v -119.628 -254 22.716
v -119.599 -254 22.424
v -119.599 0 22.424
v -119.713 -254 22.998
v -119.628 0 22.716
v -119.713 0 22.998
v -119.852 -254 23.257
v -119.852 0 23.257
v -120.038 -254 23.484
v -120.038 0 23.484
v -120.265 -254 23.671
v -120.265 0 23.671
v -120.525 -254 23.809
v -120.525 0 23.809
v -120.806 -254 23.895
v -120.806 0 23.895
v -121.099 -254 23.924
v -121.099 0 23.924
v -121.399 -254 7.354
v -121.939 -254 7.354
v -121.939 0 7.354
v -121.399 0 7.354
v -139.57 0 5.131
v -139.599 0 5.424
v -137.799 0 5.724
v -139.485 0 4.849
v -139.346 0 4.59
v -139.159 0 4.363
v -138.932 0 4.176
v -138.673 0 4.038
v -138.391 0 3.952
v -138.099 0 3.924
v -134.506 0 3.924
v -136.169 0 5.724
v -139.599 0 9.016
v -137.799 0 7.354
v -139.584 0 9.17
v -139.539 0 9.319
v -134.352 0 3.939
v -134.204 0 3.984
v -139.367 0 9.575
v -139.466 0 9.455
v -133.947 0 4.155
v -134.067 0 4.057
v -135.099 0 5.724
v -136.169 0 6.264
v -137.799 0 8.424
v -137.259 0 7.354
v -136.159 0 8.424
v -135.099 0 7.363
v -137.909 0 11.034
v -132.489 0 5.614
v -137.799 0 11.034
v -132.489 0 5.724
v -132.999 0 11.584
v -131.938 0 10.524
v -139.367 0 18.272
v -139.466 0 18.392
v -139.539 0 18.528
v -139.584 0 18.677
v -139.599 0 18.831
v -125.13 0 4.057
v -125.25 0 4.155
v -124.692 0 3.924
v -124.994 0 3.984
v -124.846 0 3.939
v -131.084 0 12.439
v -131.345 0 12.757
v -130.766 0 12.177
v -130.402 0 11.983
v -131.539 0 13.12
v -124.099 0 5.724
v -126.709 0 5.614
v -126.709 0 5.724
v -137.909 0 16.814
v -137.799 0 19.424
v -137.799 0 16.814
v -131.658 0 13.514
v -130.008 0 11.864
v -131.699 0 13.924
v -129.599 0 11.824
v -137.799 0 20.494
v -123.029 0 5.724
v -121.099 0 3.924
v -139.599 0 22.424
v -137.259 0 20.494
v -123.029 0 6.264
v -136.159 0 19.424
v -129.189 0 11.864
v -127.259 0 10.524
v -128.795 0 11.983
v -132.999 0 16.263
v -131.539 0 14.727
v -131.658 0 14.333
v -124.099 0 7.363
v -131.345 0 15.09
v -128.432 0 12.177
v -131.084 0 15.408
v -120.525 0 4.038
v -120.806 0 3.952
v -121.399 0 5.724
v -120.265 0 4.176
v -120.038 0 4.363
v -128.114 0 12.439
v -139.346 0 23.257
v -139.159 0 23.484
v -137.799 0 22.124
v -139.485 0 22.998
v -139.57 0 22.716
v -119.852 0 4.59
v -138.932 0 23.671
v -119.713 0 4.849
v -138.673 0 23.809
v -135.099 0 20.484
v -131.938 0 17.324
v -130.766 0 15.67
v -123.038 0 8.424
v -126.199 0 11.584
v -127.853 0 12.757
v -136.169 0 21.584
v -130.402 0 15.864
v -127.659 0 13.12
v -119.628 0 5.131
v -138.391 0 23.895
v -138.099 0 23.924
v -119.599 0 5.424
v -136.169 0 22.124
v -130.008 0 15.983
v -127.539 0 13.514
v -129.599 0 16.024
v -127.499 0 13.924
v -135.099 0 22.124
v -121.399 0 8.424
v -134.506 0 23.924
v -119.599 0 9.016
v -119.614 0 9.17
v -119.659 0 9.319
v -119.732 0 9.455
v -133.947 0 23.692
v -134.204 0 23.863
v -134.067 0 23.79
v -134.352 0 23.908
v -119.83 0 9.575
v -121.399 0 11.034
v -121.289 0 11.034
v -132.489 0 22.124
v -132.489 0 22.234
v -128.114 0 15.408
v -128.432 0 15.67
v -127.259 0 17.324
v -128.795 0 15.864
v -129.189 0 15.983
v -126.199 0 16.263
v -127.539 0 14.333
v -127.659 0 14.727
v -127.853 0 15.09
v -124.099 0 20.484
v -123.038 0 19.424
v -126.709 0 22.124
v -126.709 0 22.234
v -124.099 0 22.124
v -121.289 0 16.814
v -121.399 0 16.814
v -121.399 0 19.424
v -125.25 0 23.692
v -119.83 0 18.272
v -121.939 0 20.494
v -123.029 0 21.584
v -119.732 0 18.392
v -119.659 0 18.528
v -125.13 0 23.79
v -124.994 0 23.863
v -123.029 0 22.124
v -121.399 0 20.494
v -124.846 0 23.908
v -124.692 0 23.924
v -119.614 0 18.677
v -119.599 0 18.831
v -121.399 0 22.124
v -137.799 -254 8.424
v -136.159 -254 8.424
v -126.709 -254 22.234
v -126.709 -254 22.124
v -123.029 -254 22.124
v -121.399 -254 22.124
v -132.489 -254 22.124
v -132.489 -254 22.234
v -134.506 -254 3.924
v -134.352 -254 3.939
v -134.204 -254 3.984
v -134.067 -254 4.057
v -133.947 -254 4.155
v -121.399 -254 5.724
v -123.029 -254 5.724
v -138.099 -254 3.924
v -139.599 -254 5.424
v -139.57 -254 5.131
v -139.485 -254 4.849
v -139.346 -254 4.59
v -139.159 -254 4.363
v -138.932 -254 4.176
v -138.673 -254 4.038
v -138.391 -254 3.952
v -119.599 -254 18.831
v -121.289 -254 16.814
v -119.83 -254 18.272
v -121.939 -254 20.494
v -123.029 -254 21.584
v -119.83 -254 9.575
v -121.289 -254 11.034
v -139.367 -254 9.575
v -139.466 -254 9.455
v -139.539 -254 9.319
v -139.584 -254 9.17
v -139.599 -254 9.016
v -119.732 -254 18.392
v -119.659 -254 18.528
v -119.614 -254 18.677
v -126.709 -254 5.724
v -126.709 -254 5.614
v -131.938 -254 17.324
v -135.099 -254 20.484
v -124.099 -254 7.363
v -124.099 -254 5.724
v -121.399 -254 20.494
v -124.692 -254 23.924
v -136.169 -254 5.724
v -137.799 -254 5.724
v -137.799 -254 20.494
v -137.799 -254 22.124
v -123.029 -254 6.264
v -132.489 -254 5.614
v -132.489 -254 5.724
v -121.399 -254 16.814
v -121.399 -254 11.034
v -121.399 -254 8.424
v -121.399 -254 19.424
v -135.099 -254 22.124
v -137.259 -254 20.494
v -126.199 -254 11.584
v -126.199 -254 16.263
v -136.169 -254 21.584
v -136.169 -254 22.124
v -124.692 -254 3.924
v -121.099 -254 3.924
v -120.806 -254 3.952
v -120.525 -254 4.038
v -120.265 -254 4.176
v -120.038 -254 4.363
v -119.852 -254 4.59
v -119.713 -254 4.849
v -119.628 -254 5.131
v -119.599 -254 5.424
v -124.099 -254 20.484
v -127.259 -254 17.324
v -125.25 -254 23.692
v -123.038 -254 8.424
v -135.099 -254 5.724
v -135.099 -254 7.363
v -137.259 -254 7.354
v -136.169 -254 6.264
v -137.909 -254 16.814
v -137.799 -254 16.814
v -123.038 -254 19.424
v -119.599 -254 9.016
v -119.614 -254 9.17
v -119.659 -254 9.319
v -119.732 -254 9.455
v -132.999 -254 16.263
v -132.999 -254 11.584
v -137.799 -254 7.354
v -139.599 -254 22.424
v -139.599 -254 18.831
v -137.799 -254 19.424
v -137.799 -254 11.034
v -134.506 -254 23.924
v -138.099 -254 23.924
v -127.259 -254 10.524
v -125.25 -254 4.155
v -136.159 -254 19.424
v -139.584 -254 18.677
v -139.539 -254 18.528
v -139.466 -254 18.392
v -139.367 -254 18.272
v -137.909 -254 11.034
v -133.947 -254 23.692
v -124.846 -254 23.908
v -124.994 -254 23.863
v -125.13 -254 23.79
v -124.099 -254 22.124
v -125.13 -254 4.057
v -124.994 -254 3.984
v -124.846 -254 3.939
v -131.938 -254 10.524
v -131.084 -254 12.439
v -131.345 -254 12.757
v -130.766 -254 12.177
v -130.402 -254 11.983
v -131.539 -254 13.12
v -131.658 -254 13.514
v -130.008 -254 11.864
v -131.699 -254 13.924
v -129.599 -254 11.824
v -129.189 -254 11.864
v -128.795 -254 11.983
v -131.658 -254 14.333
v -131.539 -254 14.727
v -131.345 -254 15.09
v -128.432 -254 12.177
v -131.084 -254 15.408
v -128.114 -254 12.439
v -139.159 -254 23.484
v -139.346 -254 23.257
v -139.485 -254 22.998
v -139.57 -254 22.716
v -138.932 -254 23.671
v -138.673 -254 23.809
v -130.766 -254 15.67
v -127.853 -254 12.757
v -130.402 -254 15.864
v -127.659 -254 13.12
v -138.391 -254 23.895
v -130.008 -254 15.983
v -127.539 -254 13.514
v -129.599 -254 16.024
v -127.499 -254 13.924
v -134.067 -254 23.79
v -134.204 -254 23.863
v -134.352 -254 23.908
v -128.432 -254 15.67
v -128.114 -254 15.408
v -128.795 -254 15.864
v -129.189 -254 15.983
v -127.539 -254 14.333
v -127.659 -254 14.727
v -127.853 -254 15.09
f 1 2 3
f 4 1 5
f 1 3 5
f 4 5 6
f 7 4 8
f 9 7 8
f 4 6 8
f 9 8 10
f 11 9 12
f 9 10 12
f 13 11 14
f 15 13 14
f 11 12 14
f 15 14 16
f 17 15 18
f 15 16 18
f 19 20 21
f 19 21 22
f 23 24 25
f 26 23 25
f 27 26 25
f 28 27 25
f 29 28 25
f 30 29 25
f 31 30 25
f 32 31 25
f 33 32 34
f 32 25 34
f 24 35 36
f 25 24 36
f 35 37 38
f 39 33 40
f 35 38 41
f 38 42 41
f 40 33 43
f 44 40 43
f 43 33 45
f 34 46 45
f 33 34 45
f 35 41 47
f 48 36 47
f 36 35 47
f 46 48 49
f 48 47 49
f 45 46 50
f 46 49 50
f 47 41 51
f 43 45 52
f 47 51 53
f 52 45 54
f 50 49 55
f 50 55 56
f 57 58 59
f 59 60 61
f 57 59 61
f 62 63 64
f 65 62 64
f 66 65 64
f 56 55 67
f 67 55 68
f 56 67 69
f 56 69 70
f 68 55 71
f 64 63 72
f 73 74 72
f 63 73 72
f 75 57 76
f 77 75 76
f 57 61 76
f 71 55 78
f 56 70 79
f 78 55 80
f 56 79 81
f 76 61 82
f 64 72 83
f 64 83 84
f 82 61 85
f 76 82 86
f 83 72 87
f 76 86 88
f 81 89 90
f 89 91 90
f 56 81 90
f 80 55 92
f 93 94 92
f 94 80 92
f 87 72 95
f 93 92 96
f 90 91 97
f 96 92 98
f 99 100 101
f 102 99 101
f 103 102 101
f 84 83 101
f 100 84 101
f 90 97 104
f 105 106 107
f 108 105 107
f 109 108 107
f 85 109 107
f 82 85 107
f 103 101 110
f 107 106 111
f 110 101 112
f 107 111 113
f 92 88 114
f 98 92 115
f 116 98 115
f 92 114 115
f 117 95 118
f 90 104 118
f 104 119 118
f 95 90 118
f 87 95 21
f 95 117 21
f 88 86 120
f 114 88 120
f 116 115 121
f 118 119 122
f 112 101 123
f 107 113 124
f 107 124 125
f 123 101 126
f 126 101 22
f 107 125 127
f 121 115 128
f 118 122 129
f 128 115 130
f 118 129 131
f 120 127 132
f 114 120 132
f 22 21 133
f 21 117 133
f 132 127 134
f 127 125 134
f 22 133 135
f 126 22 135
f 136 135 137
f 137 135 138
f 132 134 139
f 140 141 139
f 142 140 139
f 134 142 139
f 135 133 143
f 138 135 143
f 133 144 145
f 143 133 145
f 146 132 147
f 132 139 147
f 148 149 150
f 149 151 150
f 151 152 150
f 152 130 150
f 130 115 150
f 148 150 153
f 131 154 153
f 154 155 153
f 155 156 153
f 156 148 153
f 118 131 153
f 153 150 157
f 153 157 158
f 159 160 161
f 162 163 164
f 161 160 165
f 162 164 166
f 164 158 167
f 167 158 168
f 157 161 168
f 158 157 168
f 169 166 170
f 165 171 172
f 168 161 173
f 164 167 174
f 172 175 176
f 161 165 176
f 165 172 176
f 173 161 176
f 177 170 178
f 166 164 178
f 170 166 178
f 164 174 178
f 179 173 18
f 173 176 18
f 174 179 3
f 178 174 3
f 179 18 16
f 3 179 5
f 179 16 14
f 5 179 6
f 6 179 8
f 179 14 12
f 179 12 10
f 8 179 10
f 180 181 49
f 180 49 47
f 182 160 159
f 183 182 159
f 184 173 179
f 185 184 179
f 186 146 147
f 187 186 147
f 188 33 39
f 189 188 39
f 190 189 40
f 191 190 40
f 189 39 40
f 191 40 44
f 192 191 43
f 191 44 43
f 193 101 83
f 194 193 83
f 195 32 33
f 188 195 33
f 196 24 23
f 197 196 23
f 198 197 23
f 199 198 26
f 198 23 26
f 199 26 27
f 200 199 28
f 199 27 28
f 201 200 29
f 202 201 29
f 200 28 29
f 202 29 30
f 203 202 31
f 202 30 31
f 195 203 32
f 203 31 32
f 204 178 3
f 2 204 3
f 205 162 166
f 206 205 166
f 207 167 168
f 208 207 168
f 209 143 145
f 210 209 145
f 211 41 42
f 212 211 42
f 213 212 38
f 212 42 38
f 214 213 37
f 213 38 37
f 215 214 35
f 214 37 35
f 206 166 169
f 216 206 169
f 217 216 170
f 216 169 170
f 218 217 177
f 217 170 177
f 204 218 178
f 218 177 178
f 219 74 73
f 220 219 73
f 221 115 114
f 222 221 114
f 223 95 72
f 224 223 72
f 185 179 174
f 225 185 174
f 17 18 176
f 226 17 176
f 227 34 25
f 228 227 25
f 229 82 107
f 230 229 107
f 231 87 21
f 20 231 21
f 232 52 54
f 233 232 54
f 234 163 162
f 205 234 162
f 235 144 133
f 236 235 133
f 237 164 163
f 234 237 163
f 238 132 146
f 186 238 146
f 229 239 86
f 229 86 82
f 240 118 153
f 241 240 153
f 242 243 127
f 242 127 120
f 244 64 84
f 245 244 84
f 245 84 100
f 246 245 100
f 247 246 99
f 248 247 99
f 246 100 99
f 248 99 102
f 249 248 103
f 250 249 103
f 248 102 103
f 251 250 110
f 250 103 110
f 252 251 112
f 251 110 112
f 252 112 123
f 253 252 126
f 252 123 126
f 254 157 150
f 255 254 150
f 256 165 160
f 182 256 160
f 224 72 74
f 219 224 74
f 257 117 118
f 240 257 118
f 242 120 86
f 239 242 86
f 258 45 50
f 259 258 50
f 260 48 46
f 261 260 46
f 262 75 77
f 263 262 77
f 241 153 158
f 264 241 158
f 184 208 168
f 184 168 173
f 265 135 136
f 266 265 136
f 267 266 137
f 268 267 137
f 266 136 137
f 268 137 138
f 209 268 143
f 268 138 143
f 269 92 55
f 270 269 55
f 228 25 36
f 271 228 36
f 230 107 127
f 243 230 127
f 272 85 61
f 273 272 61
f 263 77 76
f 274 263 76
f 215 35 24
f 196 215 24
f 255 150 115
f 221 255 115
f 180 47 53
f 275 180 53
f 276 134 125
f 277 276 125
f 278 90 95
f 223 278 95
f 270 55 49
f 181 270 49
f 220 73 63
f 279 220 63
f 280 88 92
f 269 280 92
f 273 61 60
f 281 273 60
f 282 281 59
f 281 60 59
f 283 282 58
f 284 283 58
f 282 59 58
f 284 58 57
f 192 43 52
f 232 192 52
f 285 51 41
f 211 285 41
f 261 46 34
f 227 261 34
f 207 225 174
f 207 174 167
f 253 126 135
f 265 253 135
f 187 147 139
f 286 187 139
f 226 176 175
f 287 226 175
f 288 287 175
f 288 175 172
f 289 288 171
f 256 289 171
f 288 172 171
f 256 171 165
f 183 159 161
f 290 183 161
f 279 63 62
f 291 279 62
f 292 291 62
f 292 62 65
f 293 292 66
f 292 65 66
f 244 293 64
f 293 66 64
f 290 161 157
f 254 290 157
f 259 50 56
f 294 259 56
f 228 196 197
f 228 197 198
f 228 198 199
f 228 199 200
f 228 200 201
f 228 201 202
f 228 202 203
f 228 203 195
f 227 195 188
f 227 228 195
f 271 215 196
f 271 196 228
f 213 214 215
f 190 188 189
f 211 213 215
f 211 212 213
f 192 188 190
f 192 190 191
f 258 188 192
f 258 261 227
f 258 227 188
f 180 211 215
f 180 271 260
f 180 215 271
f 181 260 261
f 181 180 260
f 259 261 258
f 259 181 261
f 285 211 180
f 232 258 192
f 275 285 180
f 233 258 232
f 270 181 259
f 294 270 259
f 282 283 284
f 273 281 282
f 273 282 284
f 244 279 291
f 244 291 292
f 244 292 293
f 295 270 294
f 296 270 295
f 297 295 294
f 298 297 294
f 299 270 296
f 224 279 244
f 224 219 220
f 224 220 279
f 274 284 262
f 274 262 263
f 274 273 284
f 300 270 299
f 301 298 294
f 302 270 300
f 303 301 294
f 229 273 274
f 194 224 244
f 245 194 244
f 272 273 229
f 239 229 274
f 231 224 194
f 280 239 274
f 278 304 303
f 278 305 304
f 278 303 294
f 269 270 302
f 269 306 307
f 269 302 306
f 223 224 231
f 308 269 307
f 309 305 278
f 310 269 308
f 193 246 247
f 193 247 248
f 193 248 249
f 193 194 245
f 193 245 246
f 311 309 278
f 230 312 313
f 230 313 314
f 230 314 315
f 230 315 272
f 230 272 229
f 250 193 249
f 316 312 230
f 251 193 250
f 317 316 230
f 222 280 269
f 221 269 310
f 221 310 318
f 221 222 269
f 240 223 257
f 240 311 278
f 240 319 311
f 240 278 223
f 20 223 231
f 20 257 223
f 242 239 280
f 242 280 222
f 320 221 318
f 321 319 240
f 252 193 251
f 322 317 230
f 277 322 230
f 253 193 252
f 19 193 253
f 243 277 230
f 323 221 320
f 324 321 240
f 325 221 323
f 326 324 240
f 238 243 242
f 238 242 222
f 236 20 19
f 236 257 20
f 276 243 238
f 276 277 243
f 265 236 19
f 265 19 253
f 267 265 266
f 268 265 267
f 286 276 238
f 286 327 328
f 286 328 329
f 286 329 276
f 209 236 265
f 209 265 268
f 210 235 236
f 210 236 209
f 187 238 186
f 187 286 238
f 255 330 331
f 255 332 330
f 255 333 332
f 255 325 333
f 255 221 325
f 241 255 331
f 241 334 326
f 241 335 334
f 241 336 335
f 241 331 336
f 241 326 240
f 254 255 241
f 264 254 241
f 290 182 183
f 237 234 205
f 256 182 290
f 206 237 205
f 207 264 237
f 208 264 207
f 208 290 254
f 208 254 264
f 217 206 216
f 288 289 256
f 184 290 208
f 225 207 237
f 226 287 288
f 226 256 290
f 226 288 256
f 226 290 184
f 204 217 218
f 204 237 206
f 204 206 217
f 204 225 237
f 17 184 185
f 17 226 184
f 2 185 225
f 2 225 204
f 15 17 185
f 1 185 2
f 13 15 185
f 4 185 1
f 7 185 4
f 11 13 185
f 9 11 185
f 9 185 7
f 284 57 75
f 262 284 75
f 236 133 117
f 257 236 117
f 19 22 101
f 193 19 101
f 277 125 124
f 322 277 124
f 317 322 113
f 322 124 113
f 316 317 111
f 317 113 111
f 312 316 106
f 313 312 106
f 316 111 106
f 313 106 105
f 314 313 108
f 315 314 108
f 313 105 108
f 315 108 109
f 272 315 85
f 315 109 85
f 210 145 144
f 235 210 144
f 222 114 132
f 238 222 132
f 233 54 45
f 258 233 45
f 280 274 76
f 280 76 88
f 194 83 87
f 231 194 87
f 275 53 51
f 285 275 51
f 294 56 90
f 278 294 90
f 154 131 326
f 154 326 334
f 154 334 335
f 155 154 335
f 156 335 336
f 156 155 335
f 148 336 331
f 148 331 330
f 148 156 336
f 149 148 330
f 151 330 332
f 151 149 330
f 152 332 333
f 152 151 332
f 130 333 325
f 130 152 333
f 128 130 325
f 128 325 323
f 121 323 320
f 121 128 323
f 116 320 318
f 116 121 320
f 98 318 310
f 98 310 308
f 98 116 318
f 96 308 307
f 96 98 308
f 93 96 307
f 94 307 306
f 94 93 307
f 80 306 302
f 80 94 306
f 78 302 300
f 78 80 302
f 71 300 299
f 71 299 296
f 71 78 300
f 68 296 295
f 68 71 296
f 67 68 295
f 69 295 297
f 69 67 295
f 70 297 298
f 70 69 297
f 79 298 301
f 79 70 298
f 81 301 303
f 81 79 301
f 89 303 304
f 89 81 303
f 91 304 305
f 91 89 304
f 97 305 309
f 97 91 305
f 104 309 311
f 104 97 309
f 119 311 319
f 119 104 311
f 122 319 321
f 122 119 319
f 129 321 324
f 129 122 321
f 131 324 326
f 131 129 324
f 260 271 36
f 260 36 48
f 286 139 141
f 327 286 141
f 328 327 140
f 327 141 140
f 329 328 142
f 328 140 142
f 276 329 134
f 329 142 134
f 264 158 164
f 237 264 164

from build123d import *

# Parameters (mm, degrees)
F0_R     = 2.1
F1_DEPTH = 254


with BuildPart() as f1:
    # F0 (on Front) → F1 (new body)
    with BuildSketch(Plane.XZ):
        with BuildLine():
            Line((-123.038144, 8.423504), (-126.198804, 11.584164))
            Line((-126.198804, 11.584164), (-126.198804, 16.262844))
            Line((-126.198804, 16.262844), (-123.038144, 19.423504))
            Line((-123.038144, 19.423504), (-121.398804, 19.423504))
            Line((-121.398804, 19.423504), (-121.398804, 16.813504))
            Line((-121.398804, 16.813504), (-121.288804, 16.813504))
            Line((-121.288804, 16.813504), (-119.83019, 18.272118))
            ThreePointArc((-119.83019, 18.272118), (-119.65894, 18.528413), (-119.598804, 18.830732))
            Line((-119.598804, 18.830732), (-119.598804, 22.423504))
            ThreePointArc((-119.598804, 22.423504), (-120.038144, 23.484164), (-121.098804, 23.923504))
            Line((-121.098804, 23.923504), (-124.691576, 23.923504))
            ThreePointArc((-124.691576, 23.923504), (-124.993896, 23.863369), (-125.25019, 23.692118))
            Line((-125.25019, 23.692118), (-126.708804, 22.233504))
            Line((-126.708804, 22.233504), (-126.708804, 22.123504))
            Line((-126.708804, 22.123504), (-124.098804, 22.123504))
            Line((-124.098804, 22.123504), (-124.098804, 20.484164))
            Line((-124.098804, 20.484164), (-127.259465, 17.323504))
            Line((-127.259465, 17.323504), (-131.938144, 17.323504))
            Line((-131.938144, 17.323504), (-135.098804, 20.484164))
            Line((-135.098804, 20.484164), (-135.098804, 22.123504))
            Line((-135.098804, 22.123504), (-132.488804, 22.123504))
            Line((-132.488804, 22.123504), (-132.488804, 22.233504))
            Line((-132.488804, 22.233504), (-133.947419, 23.692118))
            ThreePointArc((-133.947419, 23.692118), (-134.203713, 23.863369), (-134.506033, 23.923504))
            Line((-134.506033, 23.923504), (-138.098804, 23.923504))
            ThreePointArc((-138.098804, 23.923504), (-139.159465, 23.484164), (-139.598804, 22.423504))
            Line((-139.598804, 22.423504), (-139.598804, 18.830732))
            ThreePointArc((-139.598804, 18.830732), (-139.538669, 18.528413), (-139.367419, 18.272118))
            Line((-139.367419, 18.272118), (-137.908804, 16.813504))
            Line((-137.908804, 16.813504), (-137.798804, 16.813504))
            Line((-137.798804, 16.813504), (-137.798804, 19.423504))
            Line((-137.798804, 19.423504), (-136.159465, 19.423504))
            Line((-136.159465, 19.423504), (-132.998804, 16.262844))
            Line((-132.998804, 16.262844), (-132.998804, 11.584164))
            Line((-132.998804, 11.584164), (-136.159465, 8.423504))
            Line((-136.159465, 8.423504), (-137.798804, 8.423504))
            Line((-137.798804, 8.423504), (-137.798804, 11.033504))
            Line((-137.798804, 11.033504), (-137.908804, 11.033504))
            Line((-137.908804, 11.033504), (-139.367419, 9.574889))
            ThreePointArc((-139.367419, 9.574889), (-139.538669, 9.318595), (-139.598804, 9.016275))
            Line((-139.598804, 9.016275), (-139.598804, 5.423504))
            ThreePointArc((-139.598804, 5.423504), (-139.159465, 4.362844), (-138.098804, 3.923504))
            Line((-138.098804, 3.923504), (-134.506033, 3.923504))
            ThreePointArc((-134.506033, 3.923504), (-134.203713, 3.983639), (-133.947419, 4.154889))
            Line((-133.947419, 4.154889), (-132.488804, 5.613504))
            Line((-132.488804, 5.613504), (-132.488804, 5.723504))
            Line((-132.488804, 5.723504), (-135.098804, 5.723504))
            Line((-135.098804, 5.723504), (-135.098804, 7.362844))
            Line((-135.098804, 7.362844), (-131.938144, 10.523504))
            Line((-131.938144, 10.523504), (-127.259465, 10.523504))
            Line((-127.259465, 10.523504), (-124.098804, 7.362844))
            Line((-124.098804, 7.362844), (-124.098804, 5.723504))
            Line((-124.098804, 5.723504), (-126.708804, 5.723504))
            Line((-126.708804, 5.723504), (-126.708804, 5.613504))
            Line((-126.708804, 5.613504), (-125.25019, 4.154889))
            ThreePointArc((-125.25019, 4.154889), (-124.993896, 3.983639), (-124.691576, 3.923504))
            Line((-124.691576, 3.923504), (-121.098804, 3.923504))
            ThreePointArc((-121.098804, 3.923504), (-120.038144, 4.362844), (-119.598804, 5.423504))
            Line((-119.598804, 5.423504), (-119.598804, 9.016275))
            ThreePointArc((-119.598804, 9.016275), (-119.65894, 9.318595), (-119.83019, 9.574889))
            Line((-119.83019, 9.574889), (-121.288804, 11.033504))
            Line((-121.288804, 11.033504), (-121.398804, 11.033504))
            Line((-121.398804, 11.033504), (-121.398804, 8.423504))
            Line((-121.398804, 8.423504), (-123.038144, 8.423504))
        make_face()
        Polygon((-137.798804, 7.353504), (-137.258804, 7.353504), (-136.168804, 6.263504), (-136.168804, 5.723504), (-137.798804, 5.723504), align=None, mode=Mode.SUBTRACT)
        Polygon((-121.938804, 7.353504), (-121.398804, 7.353504), (-121.398804, 5.723504), (-123.028804, 5.723504), (-123.028804, 6.263504), align=None, mode=Mode.SUBTRACT)
        with Locations((-129.598804, 13.923504)):
            Circle(F0_R, mode=Mode.SUBTRACT)
        Polygon((-136.168804, 22.123504), (-136.168804, 21.583504), (-137.258804, 20.493504), (-137.798804, 20.493504), (-137.798804, 22.123504), align=None, mode=Mode.SUBTRACT)
        Polygon((-123.028804, 21.583504), (-123.028804, 22.123504), (-121.398804, 22.123504), (-121.398804, 20.493504), (-121.938804, 20.493504), align=None, mode=Mode.SUBTRACT)
    extrude(amount=F1_DEPTH)


solid = f1.part
